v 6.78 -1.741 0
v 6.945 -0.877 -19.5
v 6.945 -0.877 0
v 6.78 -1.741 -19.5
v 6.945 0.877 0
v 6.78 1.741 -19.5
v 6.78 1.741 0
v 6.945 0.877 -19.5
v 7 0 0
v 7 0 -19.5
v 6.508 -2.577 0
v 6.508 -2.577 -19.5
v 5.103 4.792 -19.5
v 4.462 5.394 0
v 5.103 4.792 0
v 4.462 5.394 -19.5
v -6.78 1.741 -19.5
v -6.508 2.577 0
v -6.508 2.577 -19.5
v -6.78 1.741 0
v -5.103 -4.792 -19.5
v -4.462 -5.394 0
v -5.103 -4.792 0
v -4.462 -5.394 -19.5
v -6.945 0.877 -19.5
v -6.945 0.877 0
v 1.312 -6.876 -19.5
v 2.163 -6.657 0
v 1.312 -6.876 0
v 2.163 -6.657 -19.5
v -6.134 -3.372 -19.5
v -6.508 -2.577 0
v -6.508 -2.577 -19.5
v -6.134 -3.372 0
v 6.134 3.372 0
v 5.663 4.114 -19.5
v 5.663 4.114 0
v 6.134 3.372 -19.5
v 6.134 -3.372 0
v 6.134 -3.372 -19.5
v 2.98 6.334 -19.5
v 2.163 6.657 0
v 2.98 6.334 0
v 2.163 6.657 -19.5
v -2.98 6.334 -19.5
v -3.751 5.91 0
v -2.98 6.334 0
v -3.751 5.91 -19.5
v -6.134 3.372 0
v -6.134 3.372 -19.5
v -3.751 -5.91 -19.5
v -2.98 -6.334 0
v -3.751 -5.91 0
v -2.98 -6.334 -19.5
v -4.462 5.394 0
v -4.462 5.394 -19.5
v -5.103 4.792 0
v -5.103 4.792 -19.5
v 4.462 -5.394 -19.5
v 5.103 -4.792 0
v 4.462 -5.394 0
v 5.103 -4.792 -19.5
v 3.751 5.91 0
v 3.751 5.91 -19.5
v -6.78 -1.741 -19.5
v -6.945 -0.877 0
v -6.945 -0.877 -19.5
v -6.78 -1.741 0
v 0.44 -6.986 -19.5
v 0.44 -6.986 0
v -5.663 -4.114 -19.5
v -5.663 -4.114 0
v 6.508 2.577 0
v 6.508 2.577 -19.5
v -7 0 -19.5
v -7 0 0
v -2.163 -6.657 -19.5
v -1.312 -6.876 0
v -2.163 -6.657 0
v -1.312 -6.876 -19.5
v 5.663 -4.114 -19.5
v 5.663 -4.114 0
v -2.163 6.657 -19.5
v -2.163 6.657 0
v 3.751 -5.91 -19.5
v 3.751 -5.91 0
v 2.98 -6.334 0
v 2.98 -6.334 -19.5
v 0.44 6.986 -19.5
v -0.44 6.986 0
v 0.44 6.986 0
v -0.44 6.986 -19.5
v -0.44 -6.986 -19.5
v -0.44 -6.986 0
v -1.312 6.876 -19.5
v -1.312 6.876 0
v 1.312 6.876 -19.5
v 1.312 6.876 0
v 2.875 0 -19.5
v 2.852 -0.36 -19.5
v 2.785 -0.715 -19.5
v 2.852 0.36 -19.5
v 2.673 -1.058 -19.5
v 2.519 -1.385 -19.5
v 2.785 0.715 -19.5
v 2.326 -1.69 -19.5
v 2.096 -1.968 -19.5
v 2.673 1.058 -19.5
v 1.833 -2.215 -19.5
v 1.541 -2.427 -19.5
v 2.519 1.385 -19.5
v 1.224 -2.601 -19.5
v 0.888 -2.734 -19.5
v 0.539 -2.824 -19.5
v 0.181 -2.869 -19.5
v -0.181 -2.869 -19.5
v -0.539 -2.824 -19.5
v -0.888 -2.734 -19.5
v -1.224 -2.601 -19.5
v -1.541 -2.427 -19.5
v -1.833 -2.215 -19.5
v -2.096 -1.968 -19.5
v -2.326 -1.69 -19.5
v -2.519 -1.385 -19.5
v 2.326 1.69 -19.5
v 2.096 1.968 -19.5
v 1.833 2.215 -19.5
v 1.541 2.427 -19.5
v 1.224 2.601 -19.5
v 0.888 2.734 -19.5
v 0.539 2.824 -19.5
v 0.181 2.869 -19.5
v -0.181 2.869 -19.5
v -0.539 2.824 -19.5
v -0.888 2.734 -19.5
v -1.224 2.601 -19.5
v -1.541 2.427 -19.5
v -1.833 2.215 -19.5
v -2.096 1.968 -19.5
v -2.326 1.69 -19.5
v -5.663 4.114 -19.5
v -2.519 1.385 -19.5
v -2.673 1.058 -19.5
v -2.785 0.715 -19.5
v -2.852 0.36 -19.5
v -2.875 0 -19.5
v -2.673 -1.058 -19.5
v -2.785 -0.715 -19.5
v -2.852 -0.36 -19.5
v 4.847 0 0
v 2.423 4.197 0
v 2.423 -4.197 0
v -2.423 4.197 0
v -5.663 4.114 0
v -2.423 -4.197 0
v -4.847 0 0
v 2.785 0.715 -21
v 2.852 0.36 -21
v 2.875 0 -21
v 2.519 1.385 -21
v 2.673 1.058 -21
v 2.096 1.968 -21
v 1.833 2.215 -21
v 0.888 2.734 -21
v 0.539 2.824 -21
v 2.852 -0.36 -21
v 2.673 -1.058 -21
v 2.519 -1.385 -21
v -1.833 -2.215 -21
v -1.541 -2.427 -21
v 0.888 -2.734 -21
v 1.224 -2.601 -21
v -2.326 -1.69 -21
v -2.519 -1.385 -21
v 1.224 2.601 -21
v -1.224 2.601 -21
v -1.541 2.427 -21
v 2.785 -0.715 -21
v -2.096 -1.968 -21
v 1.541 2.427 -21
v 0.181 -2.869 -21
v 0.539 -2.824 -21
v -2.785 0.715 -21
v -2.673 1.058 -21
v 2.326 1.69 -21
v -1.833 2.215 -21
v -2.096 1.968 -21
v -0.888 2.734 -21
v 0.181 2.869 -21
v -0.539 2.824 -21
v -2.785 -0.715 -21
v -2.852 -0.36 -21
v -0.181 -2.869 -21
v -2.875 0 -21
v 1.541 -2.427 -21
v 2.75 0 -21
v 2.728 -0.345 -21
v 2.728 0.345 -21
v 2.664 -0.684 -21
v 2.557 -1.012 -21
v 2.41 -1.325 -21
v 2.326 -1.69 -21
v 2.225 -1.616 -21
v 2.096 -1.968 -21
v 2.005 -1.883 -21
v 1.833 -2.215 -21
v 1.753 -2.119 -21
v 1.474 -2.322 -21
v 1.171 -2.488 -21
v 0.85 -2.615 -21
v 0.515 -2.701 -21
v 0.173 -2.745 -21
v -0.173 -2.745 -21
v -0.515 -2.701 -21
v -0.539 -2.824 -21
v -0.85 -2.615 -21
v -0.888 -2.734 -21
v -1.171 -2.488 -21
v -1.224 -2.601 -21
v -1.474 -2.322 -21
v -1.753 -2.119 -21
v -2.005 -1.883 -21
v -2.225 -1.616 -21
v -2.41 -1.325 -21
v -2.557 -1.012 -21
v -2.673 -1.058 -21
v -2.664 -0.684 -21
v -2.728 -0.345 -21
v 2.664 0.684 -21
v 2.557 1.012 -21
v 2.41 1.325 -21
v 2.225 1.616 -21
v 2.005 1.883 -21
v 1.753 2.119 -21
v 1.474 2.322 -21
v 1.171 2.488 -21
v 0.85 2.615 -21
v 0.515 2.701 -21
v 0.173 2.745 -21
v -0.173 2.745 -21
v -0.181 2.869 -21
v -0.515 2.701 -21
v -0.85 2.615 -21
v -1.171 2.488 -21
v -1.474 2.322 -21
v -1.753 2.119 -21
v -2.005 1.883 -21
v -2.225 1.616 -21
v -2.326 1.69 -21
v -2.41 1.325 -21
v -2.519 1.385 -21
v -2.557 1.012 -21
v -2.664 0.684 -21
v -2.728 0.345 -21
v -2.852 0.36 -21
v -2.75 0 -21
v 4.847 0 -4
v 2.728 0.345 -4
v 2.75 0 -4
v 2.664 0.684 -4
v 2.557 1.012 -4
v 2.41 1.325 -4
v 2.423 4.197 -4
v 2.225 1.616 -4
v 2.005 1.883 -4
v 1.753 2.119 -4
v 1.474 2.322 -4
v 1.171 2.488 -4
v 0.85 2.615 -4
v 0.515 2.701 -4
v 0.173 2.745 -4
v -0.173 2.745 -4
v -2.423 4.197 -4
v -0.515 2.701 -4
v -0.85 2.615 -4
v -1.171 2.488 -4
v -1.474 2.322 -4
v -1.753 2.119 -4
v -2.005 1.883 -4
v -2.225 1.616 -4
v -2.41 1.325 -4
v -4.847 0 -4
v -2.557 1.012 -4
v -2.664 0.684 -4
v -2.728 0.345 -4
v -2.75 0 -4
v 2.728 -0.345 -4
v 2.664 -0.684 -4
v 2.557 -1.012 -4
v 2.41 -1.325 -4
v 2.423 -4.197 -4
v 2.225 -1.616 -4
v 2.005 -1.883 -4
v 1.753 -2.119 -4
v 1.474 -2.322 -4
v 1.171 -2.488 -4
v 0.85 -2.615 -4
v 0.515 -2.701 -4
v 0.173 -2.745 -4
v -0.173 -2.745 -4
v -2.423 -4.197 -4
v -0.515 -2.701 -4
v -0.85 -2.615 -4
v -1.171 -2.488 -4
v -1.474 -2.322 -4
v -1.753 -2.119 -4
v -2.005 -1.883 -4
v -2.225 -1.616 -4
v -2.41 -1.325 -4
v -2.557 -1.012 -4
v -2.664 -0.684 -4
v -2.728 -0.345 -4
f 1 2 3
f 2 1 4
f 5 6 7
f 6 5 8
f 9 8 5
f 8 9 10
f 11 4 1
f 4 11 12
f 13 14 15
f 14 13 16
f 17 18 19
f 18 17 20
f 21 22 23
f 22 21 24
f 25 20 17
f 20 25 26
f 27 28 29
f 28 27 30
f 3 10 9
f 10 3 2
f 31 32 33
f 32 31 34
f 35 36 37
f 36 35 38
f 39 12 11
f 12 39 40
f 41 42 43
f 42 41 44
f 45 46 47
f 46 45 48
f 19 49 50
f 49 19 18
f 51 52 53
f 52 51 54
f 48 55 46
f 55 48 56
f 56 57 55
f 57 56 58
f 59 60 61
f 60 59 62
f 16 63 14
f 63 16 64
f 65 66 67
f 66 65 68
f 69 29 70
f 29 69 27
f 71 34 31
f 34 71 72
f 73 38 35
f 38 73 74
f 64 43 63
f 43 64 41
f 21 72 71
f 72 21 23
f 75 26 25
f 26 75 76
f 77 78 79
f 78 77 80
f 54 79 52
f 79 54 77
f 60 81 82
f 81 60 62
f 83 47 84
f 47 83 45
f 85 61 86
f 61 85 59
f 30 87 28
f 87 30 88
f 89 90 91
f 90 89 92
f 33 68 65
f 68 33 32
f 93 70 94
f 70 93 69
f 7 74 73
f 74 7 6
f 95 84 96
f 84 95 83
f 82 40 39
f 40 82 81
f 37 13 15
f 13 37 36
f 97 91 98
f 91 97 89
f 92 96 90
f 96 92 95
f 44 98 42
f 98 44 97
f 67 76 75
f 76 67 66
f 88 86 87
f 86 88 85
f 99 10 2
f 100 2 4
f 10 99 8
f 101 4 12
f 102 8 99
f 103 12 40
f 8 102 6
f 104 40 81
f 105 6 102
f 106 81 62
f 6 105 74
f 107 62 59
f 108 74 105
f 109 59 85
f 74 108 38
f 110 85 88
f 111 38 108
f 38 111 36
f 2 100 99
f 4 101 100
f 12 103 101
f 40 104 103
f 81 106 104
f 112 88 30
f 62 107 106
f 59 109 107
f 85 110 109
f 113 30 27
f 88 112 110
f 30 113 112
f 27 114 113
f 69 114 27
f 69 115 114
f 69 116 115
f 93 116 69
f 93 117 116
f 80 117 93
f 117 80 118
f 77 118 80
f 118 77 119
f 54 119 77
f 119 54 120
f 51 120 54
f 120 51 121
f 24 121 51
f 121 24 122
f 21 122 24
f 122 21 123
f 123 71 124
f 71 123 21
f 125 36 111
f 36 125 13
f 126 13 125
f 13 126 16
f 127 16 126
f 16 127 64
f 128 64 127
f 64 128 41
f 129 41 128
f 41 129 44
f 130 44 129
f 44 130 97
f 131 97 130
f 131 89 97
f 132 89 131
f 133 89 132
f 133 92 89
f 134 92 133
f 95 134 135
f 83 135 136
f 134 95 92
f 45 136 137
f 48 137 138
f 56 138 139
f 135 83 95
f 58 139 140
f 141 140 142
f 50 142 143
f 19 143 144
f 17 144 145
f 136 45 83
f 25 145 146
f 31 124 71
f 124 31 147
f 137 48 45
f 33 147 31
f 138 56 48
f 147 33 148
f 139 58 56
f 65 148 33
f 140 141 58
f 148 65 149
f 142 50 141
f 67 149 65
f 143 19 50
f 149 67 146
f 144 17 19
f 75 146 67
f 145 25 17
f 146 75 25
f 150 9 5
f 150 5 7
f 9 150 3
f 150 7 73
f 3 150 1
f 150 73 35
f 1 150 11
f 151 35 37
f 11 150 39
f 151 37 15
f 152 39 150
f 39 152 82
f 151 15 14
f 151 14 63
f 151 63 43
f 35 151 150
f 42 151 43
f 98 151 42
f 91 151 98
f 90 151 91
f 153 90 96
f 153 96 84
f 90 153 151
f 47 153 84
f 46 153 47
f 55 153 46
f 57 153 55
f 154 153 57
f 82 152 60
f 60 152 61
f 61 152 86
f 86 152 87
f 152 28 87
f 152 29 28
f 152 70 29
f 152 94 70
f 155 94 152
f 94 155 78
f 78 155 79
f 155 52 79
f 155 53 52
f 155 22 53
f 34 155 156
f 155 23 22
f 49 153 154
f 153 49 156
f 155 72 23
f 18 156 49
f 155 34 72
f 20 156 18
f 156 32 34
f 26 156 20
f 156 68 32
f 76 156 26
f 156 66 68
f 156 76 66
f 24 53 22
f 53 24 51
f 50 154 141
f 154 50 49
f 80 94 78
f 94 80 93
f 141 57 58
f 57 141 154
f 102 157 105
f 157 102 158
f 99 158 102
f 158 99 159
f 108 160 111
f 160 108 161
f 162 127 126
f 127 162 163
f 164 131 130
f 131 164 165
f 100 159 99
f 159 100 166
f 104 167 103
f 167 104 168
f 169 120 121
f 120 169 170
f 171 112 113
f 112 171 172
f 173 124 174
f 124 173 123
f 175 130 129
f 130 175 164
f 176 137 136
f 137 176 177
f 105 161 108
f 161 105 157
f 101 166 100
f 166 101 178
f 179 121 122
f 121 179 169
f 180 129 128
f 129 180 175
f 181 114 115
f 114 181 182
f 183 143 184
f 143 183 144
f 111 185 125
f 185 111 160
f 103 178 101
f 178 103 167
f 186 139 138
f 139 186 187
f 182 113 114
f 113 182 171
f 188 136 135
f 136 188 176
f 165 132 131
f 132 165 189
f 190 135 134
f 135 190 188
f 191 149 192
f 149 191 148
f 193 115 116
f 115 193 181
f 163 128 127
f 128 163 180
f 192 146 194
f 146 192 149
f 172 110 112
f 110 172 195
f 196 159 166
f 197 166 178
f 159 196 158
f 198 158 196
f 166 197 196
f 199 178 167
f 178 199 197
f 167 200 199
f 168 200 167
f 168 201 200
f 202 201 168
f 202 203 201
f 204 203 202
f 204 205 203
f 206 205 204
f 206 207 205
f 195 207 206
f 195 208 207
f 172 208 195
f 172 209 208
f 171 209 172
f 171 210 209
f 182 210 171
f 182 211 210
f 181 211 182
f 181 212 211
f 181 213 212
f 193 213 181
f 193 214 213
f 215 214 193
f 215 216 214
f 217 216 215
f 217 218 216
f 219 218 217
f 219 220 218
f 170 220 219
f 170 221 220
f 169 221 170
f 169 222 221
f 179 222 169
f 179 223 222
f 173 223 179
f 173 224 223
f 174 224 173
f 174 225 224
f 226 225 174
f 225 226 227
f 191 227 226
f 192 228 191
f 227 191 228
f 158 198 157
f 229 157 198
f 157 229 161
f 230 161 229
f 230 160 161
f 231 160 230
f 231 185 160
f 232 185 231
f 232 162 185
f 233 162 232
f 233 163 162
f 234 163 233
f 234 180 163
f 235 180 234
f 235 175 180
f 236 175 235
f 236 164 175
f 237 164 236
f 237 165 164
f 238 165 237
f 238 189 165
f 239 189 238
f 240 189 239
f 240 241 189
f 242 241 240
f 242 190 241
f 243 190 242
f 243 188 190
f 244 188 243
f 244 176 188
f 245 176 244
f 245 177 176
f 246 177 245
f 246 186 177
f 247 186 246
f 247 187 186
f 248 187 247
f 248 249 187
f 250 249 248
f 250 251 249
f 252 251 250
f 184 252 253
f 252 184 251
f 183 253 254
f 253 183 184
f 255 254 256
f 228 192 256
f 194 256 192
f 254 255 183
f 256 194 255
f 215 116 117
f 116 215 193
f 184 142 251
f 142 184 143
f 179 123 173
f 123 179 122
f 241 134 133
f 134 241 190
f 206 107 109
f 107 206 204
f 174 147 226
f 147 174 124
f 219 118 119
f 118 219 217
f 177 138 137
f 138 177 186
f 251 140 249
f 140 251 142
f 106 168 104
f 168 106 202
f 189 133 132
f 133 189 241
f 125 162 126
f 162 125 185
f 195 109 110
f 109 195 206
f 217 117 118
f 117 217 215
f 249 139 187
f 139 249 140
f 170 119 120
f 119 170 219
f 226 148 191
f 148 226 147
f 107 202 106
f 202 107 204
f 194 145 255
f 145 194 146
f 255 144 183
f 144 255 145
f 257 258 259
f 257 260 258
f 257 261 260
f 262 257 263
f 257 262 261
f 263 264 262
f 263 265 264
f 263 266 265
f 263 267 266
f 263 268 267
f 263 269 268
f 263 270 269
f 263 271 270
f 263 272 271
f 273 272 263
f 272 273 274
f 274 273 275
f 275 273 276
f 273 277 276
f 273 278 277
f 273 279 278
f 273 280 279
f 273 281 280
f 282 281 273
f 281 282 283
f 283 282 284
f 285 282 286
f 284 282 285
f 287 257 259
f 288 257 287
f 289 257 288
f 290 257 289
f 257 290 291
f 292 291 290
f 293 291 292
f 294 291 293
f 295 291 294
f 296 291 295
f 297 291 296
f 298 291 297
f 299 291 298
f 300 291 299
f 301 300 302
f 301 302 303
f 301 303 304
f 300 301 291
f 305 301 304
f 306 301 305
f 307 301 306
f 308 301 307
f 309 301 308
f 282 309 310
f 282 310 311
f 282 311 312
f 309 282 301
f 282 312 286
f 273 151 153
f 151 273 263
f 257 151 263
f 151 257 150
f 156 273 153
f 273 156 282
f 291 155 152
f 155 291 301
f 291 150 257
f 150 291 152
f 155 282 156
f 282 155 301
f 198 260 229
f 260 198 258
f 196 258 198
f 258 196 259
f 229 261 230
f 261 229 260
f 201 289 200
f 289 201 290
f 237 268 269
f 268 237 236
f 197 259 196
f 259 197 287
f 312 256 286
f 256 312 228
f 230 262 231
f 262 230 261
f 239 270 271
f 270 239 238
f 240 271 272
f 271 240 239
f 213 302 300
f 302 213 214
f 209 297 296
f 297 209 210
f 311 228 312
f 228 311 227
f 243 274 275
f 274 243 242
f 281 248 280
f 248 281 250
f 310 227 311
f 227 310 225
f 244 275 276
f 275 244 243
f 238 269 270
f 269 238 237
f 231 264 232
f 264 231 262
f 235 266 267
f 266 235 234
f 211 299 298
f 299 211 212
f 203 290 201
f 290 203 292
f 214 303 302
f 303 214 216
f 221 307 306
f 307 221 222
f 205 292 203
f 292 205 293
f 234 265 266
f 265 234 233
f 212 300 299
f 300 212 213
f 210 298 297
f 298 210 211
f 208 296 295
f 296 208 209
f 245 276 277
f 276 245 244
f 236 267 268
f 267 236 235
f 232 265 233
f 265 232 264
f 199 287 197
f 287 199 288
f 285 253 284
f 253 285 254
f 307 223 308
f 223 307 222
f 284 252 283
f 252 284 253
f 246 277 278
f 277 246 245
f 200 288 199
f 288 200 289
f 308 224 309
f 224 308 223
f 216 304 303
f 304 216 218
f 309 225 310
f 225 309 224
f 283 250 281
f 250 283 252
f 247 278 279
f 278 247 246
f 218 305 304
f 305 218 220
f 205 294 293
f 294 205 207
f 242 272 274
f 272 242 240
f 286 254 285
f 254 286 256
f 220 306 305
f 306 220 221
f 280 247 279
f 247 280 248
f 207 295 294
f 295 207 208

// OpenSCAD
$fn = 50;

difference() {
	union() {
		translate(v = [0, 0, -19.5]) {
			cylinder(h = 19.5, r = 7.0);
		}
		#translate(v = [0, 0, -21.0]) {
			cylinder(h = 21, r = 2.875);
		}
	}
	union() {
		translate(v = [0, 0, 0]) {
			rotate(a = [0, 0, 0]) {
				difference() {
					union() {
						translate(v = [0, 0, -4]) {
							linear_extrude(height = 4) {
								polygon(points = [[4.8468, 0.0], [2.4234000000000004, 4.197451927062417], [-2.423399999999999, 4.197451927062417], [-4.8468, 5.935618106107392e-16], [-2.423400000000002, -4.197451927062416], [2.423399999999997, -4.197451927062419]]);
							}
						}
					}
					union();
				}
			}
		}
		#translate(v = [0, 0, -100.0]) {
			cylinder(h = 200, r = 2.75);
		}
	}
}
